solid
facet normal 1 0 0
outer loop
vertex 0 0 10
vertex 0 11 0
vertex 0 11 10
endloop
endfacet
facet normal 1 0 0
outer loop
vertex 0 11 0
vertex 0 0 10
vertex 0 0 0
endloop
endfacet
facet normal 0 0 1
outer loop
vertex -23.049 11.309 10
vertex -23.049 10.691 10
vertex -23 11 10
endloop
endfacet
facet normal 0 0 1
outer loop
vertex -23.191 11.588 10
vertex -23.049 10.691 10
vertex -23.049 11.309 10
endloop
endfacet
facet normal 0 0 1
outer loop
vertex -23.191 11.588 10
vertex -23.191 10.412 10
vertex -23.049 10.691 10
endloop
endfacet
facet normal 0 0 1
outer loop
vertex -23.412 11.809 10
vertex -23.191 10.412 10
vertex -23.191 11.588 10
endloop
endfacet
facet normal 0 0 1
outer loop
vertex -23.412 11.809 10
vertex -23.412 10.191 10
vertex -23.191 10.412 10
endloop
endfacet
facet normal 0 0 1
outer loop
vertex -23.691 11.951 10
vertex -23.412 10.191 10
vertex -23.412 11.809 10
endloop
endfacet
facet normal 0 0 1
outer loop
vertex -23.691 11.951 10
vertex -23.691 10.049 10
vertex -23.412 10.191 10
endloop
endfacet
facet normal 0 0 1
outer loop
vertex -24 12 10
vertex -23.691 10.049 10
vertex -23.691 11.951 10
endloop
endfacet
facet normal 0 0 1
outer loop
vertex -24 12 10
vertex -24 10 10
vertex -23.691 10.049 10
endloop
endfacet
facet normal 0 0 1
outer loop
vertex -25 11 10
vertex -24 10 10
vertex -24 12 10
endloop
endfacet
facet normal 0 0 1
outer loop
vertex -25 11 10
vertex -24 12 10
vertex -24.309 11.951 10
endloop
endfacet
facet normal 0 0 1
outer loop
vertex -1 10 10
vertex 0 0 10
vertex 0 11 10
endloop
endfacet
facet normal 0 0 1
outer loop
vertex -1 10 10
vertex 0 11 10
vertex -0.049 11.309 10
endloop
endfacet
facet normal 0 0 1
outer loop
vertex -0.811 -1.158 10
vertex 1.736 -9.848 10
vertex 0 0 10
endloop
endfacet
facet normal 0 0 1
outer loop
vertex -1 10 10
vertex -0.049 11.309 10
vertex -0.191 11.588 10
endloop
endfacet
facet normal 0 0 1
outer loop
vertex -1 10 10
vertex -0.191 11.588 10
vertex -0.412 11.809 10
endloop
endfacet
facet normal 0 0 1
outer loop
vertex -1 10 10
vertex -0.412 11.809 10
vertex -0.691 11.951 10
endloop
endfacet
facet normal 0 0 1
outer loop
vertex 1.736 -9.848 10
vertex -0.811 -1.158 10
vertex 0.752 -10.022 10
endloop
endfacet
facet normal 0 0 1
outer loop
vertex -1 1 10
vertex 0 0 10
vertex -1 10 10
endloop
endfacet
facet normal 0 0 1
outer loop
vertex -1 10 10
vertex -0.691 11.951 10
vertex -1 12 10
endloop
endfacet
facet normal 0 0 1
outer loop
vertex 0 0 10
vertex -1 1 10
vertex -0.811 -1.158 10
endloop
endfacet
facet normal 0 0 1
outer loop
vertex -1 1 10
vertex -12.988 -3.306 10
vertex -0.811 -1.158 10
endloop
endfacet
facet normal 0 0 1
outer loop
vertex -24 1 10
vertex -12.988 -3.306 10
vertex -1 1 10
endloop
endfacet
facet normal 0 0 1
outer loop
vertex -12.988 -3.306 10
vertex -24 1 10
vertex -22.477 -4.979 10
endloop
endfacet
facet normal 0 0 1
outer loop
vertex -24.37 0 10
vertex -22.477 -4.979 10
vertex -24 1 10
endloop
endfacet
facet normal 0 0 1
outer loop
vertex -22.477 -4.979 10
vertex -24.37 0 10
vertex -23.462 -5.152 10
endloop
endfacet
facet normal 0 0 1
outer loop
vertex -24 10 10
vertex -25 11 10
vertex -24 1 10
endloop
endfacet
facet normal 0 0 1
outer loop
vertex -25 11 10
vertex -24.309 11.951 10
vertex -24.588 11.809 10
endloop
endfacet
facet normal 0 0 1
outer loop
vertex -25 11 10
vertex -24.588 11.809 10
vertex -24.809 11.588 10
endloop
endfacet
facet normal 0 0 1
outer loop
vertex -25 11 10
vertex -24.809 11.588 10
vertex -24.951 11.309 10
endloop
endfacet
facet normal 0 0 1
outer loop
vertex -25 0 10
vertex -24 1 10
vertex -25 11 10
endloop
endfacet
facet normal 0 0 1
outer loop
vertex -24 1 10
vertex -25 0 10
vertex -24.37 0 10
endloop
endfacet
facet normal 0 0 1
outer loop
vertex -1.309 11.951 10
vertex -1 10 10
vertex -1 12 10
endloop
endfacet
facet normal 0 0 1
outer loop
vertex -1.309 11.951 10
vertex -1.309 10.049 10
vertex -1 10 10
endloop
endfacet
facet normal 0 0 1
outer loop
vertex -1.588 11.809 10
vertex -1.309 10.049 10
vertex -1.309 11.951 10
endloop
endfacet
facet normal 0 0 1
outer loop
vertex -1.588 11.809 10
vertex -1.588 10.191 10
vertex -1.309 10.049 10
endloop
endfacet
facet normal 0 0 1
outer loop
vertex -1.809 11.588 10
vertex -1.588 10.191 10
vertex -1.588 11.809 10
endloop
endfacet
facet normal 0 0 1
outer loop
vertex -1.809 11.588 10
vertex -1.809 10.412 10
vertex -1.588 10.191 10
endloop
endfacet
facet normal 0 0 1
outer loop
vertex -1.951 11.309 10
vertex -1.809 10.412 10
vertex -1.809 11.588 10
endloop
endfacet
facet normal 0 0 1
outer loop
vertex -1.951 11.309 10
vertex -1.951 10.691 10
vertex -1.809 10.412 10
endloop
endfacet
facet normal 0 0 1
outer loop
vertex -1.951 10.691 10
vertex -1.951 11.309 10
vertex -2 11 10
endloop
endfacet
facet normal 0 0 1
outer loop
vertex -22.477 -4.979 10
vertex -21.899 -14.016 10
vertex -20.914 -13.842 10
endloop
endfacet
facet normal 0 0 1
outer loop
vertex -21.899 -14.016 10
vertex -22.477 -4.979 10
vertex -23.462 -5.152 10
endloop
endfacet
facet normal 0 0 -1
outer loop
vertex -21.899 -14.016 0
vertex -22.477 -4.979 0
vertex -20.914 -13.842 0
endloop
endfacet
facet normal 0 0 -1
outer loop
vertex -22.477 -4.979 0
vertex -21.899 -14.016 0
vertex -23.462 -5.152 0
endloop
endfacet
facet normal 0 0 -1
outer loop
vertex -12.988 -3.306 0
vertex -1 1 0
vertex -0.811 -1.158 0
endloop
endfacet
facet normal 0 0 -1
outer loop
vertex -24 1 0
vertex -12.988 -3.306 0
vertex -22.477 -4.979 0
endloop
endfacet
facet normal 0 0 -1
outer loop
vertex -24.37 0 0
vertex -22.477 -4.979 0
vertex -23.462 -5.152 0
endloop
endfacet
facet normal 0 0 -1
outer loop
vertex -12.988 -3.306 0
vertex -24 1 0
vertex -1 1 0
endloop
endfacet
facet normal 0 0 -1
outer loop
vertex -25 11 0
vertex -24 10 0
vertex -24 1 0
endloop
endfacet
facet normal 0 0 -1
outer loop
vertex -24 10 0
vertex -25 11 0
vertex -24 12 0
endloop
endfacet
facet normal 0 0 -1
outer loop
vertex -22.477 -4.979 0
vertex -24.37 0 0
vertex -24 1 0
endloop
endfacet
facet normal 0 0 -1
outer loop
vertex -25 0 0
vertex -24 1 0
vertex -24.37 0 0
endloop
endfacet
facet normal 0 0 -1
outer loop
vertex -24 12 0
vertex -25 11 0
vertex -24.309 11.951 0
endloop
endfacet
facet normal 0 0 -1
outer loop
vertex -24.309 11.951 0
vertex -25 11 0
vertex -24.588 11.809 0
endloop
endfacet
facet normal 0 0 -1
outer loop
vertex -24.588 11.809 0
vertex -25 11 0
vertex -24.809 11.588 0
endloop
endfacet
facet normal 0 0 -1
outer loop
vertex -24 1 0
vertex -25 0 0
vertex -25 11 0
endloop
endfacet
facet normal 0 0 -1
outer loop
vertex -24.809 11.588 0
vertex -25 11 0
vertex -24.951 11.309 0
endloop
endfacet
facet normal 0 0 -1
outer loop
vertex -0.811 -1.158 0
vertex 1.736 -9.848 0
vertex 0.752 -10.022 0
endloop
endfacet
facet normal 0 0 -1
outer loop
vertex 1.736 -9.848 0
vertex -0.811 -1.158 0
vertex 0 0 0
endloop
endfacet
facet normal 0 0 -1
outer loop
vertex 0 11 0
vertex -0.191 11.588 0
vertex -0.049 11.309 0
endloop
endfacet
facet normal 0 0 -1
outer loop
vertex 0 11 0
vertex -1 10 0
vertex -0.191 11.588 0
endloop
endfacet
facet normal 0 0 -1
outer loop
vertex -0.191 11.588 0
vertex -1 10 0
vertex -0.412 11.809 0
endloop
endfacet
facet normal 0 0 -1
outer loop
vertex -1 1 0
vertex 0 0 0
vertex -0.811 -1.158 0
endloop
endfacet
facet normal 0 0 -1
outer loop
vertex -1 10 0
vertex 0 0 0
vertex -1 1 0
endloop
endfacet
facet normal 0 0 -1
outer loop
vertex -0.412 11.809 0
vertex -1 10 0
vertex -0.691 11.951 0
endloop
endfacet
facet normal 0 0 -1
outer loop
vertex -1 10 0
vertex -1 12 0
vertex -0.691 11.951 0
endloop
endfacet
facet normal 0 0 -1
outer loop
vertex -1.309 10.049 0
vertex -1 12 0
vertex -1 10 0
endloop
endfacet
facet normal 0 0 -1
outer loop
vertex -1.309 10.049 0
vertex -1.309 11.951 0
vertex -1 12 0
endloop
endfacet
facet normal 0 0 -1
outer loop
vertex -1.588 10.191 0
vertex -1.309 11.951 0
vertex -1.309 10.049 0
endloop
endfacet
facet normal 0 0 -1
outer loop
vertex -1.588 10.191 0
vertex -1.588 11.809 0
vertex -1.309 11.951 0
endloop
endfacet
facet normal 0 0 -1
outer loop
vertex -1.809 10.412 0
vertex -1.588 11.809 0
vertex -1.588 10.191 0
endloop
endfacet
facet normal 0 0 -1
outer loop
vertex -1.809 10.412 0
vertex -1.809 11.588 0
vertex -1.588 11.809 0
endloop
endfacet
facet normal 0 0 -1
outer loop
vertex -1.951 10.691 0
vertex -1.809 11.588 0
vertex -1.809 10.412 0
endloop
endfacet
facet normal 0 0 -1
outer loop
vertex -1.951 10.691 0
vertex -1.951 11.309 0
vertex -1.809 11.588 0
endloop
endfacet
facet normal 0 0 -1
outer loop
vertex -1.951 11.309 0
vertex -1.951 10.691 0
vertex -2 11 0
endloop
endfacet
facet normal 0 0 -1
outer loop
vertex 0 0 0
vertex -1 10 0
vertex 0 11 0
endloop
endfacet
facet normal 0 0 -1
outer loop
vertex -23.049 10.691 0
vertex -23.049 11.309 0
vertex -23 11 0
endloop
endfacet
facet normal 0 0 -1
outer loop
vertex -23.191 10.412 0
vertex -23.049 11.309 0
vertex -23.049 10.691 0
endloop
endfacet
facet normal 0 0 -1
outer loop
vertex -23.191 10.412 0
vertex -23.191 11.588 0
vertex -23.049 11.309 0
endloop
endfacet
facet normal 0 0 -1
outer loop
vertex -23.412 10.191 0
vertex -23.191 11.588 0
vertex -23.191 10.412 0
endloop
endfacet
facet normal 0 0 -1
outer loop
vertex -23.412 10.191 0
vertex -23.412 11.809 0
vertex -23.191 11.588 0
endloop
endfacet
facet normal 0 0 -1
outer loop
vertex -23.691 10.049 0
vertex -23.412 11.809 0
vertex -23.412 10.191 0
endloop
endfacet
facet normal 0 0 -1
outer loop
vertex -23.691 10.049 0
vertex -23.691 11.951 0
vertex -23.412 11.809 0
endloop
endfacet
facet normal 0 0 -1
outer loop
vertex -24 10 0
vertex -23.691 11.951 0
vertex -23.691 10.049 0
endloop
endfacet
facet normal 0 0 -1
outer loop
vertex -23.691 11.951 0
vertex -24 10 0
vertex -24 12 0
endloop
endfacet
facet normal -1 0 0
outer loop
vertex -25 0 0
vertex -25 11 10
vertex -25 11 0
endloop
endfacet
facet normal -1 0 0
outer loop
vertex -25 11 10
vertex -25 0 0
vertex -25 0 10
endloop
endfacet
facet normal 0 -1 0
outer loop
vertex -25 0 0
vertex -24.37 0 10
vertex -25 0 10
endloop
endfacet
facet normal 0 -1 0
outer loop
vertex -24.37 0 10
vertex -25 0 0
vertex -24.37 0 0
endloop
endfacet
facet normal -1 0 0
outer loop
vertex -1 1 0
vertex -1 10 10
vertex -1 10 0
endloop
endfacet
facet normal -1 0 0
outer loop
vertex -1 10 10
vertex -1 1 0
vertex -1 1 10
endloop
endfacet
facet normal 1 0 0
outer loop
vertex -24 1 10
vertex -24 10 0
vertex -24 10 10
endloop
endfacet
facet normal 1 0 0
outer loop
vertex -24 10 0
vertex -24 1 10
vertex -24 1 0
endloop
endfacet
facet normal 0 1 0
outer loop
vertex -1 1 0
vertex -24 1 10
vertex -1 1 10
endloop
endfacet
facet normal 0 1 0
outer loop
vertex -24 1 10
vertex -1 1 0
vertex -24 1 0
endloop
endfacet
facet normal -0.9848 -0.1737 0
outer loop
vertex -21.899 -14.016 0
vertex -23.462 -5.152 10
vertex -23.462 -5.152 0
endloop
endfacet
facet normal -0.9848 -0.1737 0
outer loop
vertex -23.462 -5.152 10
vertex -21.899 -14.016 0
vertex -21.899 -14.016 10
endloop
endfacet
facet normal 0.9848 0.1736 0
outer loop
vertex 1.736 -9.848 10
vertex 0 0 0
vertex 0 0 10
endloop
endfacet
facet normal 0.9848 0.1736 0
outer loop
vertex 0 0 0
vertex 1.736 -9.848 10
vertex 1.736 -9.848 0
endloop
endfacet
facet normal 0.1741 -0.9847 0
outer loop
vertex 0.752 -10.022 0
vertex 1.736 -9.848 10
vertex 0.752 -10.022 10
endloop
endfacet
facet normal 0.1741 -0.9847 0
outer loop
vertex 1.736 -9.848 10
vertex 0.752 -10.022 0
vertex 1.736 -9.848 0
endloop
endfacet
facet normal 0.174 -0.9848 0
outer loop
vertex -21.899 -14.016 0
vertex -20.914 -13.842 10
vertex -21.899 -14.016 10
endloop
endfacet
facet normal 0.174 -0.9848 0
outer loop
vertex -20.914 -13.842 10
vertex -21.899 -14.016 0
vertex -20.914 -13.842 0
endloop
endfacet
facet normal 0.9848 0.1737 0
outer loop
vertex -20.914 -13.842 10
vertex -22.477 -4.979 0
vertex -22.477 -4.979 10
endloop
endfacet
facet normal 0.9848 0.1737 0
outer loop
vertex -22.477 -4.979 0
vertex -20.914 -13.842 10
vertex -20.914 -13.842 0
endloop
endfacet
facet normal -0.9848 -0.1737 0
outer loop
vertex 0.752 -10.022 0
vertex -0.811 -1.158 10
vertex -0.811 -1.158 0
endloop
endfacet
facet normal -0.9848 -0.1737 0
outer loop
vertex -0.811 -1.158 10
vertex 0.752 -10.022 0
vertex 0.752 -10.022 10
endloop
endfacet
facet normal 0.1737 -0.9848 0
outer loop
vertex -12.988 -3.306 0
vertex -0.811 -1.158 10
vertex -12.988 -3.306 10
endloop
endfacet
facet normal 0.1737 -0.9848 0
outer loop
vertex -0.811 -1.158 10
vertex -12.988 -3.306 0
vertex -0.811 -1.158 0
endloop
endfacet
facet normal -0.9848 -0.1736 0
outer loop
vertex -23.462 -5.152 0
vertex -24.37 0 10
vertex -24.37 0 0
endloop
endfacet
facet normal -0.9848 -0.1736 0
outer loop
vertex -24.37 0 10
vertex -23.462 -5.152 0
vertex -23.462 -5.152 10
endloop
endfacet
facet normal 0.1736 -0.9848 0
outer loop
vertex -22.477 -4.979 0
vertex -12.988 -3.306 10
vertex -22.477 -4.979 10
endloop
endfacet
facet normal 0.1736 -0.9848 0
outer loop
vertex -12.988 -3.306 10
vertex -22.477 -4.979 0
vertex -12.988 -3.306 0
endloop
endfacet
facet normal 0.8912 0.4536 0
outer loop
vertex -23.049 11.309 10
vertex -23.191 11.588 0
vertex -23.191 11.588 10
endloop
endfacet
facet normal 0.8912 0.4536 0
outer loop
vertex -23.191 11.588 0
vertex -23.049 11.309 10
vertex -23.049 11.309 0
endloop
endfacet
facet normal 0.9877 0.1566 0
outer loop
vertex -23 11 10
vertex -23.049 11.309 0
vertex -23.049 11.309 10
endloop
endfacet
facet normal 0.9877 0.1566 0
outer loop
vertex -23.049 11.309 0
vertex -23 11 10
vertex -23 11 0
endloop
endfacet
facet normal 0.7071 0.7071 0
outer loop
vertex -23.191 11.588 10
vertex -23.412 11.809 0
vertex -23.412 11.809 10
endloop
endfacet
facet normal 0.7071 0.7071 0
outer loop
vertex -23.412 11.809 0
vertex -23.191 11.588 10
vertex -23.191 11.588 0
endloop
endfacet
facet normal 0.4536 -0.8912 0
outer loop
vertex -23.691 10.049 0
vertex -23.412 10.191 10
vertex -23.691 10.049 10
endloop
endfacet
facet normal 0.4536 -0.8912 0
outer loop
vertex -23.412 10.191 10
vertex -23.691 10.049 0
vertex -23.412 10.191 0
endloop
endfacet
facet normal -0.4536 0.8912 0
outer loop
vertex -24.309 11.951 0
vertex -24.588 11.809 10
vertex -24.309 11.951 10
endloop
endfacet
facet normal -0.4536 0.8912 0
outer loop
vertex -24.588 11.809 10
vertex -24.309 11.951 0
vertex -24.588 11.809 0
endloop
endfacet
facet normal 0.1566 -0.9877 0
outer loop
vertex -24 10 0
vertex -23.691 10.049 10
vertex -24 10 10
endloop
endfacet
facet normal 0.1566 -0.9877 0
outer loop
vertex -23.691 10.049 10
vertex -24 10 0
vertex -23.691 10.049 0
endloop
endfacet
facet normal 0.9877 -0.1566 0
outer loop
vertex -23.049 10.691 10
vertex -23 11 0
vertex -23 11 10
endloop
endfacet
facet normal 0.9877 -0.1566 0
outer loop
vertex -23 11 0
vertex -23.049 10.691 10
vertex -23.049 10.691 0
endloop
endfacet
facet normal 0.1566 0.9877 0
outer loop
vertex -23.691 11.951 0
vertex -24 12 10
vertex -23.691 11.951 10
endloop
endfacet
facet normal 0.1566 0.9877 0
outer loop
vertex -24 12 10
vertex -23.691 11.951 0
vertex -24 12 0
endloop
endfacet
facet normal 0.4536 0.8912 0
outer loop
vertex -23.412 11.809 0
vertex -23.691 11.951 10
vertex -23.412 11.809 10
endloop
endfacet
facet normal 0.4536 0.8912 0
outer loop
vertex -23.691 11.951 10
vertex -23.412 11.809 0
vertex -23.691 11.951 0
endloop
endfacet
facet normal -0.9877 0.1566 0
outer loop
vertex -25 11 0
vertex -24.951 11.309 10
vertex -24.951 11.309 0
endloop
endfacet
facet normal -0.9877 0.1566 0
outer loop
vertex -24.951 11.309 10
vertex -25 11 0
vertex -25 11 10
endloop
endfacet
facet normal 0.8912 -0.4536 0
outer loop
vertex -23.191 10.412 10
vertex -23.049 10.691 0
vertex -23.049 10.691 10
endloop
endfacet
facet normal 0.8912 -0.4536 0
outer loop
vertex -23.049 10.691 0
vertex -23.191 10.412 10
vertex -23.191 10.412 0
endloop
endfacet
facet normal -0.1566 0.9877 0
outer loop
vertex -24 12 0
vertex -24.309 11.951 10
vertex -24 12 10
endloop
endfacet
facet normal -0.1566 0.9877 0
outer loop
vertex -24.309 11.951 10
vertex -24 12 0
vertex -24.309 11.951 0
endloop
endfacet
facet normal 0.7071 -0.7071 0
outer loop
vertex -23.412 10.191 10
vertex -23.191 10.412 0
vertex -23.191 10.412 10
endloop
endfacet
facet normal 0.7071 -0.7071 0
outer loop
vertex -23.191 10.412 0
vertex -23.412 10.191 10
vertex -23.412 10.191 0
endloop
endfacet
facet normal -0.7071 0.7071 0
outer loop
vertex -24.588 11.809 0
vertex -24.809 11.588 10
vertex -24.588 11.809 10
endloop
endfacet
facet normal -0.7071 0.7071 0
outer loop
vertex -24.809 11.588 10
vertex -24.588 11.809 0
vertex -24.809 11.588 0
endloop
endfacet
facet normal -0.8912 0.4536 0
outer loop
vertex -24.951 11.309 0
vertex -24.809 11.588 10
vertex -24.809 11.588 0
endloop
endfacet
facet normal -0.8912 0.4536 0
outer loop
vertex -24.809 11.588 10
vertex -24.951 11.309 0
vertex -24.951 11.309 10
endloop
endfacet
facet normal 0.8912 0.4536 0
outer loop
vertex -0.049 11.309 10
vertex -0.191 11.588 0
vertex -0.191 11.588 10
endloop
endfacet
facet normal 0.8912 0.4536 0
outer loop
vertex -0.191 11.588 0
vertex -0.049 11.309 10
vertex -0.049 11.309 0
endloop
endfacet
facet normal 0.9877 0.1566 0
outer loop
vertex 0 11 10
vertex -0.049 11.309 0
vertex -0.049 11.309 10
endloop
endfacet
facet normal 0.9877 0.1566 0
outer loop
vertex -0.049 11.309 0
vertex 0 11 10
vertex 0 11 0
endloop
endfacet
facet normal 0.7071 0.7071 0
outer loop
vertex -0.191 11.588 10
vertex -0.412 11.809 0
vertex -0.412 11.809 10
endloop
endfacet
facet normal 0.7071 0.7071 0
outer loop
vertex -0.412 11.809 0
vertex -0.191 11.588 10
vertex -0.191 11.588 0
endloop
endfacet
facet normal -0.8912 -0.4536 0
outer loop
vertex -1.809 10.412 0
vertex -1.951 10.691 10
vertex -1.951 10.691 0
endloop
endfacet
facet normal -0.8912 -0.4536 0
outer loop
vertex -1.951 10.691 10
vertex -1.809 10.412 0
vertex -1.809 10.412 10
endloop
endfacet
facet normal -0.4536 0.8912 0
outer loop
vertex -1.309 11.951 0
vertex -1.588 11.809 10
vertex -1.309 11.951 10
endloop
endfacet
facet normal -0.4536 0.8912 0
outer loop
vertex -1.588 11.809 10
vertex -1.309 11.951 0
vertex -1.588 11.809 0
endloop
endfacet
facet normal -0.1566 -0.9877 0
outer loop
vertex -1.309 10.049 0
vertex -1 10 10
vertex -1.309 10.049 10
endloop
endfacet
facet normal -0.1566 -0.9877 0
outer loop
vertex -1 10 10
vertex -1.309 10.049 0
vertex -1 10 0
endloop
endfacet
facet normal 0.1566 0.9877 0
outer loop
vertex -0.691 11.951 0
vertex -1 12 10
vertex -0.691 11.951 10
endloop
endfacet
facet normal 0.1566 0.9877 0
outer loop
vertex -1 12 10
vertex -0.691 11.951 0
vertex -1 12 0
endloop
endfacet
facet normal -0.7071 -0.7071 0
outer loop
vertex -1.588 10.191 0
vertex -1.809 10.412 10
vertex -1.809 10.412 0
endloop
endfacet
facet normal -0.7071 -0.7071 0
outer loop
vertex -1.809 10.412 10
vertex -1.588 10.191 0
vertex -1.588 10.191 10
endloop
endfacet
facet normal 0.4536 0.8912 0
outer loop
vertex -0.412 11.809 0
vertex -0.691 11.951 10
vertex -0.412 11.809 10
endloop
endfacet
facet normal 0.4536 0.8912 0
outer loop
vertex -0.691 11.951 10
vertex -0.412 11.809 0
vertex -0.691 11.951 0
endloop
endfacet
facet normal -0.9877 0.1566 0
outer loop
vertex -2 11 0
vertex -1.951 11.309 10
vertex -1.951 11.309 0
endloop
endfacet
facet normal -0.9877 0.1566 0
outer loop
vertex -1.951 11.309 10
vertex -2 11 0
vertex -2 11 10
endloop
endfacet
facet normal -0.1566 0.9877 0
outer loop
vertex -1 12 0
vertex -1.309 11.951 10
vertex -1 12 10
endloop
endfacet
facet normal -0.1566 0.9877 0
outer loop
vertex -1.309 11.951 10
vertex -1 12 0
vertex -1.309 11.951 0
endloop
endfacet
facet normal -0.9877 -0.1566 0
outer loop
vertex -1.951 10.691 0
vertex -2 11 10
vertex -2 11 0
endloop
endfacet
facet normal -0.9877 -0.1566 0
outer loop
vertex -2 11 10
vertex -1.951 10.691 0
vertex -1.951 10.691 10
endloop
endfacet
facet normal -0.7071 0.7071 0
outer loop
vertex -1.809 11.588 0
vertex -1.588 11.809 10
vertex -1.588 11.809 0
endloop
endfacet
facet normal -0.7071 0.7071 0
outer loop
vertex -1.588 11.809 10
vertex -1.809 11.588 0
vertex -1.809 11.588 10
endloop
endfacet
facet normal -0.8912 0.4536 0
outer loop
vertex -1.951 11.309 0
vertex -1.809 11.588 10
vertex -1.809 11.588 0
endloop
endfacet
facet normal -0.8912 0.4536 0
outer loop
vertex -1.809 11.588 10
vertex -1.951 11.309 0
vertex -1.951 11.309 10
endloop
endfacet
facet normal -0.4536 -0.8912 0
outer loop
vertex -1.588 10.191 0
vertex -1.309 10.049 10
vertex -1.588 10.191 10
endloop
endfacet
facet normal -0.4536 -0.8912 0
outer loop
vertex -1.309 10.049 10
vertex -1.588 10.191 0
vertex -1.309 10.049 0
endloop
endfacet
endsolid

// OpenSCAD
// [FL_INDEX: keywords="openscad, 3d_parametric, Wii_Sensor_Bar_Mount, csg_solid" | COT="Parametric OpenSCAD design from 3DCodeverse"]
// Title: Wii Sensor Bar Mount

// Wii Sensor Bar Stand


// Angle of sensor
a = 10;

// Width of TV edge (mm)
w = 22;

// Depth of TV edge (mm)
d = 9;

/*[Hidden]*/
$fn=20;

// Wii sensor holder
difference(){
	translate([-25,0,0])cube([25,11,10]);
	translate([-24,1,-1]) cube([23,11,12]);
	}
	translate([-24,11,0]) cylinder(r=1,h=10);
	translate([-1,11,0]) cylinder(r=1,h=10);

// TV edge holder
difference(){
	rotate([0,0,180+a]) translate([0,0,0]) cube([w+2,d+1,10]);
	rotate([0,0,180+a]) translate([1,1,-1]) cube([w,d+1,12]);
	}

// Fill piece
intersection(){
	rotate([0,0,180+a]) translate([0,-2*d,0]) cube([w+2,2*d+1,10]);
	translate([-26,-30,0])cube([26,31,10]);
}
